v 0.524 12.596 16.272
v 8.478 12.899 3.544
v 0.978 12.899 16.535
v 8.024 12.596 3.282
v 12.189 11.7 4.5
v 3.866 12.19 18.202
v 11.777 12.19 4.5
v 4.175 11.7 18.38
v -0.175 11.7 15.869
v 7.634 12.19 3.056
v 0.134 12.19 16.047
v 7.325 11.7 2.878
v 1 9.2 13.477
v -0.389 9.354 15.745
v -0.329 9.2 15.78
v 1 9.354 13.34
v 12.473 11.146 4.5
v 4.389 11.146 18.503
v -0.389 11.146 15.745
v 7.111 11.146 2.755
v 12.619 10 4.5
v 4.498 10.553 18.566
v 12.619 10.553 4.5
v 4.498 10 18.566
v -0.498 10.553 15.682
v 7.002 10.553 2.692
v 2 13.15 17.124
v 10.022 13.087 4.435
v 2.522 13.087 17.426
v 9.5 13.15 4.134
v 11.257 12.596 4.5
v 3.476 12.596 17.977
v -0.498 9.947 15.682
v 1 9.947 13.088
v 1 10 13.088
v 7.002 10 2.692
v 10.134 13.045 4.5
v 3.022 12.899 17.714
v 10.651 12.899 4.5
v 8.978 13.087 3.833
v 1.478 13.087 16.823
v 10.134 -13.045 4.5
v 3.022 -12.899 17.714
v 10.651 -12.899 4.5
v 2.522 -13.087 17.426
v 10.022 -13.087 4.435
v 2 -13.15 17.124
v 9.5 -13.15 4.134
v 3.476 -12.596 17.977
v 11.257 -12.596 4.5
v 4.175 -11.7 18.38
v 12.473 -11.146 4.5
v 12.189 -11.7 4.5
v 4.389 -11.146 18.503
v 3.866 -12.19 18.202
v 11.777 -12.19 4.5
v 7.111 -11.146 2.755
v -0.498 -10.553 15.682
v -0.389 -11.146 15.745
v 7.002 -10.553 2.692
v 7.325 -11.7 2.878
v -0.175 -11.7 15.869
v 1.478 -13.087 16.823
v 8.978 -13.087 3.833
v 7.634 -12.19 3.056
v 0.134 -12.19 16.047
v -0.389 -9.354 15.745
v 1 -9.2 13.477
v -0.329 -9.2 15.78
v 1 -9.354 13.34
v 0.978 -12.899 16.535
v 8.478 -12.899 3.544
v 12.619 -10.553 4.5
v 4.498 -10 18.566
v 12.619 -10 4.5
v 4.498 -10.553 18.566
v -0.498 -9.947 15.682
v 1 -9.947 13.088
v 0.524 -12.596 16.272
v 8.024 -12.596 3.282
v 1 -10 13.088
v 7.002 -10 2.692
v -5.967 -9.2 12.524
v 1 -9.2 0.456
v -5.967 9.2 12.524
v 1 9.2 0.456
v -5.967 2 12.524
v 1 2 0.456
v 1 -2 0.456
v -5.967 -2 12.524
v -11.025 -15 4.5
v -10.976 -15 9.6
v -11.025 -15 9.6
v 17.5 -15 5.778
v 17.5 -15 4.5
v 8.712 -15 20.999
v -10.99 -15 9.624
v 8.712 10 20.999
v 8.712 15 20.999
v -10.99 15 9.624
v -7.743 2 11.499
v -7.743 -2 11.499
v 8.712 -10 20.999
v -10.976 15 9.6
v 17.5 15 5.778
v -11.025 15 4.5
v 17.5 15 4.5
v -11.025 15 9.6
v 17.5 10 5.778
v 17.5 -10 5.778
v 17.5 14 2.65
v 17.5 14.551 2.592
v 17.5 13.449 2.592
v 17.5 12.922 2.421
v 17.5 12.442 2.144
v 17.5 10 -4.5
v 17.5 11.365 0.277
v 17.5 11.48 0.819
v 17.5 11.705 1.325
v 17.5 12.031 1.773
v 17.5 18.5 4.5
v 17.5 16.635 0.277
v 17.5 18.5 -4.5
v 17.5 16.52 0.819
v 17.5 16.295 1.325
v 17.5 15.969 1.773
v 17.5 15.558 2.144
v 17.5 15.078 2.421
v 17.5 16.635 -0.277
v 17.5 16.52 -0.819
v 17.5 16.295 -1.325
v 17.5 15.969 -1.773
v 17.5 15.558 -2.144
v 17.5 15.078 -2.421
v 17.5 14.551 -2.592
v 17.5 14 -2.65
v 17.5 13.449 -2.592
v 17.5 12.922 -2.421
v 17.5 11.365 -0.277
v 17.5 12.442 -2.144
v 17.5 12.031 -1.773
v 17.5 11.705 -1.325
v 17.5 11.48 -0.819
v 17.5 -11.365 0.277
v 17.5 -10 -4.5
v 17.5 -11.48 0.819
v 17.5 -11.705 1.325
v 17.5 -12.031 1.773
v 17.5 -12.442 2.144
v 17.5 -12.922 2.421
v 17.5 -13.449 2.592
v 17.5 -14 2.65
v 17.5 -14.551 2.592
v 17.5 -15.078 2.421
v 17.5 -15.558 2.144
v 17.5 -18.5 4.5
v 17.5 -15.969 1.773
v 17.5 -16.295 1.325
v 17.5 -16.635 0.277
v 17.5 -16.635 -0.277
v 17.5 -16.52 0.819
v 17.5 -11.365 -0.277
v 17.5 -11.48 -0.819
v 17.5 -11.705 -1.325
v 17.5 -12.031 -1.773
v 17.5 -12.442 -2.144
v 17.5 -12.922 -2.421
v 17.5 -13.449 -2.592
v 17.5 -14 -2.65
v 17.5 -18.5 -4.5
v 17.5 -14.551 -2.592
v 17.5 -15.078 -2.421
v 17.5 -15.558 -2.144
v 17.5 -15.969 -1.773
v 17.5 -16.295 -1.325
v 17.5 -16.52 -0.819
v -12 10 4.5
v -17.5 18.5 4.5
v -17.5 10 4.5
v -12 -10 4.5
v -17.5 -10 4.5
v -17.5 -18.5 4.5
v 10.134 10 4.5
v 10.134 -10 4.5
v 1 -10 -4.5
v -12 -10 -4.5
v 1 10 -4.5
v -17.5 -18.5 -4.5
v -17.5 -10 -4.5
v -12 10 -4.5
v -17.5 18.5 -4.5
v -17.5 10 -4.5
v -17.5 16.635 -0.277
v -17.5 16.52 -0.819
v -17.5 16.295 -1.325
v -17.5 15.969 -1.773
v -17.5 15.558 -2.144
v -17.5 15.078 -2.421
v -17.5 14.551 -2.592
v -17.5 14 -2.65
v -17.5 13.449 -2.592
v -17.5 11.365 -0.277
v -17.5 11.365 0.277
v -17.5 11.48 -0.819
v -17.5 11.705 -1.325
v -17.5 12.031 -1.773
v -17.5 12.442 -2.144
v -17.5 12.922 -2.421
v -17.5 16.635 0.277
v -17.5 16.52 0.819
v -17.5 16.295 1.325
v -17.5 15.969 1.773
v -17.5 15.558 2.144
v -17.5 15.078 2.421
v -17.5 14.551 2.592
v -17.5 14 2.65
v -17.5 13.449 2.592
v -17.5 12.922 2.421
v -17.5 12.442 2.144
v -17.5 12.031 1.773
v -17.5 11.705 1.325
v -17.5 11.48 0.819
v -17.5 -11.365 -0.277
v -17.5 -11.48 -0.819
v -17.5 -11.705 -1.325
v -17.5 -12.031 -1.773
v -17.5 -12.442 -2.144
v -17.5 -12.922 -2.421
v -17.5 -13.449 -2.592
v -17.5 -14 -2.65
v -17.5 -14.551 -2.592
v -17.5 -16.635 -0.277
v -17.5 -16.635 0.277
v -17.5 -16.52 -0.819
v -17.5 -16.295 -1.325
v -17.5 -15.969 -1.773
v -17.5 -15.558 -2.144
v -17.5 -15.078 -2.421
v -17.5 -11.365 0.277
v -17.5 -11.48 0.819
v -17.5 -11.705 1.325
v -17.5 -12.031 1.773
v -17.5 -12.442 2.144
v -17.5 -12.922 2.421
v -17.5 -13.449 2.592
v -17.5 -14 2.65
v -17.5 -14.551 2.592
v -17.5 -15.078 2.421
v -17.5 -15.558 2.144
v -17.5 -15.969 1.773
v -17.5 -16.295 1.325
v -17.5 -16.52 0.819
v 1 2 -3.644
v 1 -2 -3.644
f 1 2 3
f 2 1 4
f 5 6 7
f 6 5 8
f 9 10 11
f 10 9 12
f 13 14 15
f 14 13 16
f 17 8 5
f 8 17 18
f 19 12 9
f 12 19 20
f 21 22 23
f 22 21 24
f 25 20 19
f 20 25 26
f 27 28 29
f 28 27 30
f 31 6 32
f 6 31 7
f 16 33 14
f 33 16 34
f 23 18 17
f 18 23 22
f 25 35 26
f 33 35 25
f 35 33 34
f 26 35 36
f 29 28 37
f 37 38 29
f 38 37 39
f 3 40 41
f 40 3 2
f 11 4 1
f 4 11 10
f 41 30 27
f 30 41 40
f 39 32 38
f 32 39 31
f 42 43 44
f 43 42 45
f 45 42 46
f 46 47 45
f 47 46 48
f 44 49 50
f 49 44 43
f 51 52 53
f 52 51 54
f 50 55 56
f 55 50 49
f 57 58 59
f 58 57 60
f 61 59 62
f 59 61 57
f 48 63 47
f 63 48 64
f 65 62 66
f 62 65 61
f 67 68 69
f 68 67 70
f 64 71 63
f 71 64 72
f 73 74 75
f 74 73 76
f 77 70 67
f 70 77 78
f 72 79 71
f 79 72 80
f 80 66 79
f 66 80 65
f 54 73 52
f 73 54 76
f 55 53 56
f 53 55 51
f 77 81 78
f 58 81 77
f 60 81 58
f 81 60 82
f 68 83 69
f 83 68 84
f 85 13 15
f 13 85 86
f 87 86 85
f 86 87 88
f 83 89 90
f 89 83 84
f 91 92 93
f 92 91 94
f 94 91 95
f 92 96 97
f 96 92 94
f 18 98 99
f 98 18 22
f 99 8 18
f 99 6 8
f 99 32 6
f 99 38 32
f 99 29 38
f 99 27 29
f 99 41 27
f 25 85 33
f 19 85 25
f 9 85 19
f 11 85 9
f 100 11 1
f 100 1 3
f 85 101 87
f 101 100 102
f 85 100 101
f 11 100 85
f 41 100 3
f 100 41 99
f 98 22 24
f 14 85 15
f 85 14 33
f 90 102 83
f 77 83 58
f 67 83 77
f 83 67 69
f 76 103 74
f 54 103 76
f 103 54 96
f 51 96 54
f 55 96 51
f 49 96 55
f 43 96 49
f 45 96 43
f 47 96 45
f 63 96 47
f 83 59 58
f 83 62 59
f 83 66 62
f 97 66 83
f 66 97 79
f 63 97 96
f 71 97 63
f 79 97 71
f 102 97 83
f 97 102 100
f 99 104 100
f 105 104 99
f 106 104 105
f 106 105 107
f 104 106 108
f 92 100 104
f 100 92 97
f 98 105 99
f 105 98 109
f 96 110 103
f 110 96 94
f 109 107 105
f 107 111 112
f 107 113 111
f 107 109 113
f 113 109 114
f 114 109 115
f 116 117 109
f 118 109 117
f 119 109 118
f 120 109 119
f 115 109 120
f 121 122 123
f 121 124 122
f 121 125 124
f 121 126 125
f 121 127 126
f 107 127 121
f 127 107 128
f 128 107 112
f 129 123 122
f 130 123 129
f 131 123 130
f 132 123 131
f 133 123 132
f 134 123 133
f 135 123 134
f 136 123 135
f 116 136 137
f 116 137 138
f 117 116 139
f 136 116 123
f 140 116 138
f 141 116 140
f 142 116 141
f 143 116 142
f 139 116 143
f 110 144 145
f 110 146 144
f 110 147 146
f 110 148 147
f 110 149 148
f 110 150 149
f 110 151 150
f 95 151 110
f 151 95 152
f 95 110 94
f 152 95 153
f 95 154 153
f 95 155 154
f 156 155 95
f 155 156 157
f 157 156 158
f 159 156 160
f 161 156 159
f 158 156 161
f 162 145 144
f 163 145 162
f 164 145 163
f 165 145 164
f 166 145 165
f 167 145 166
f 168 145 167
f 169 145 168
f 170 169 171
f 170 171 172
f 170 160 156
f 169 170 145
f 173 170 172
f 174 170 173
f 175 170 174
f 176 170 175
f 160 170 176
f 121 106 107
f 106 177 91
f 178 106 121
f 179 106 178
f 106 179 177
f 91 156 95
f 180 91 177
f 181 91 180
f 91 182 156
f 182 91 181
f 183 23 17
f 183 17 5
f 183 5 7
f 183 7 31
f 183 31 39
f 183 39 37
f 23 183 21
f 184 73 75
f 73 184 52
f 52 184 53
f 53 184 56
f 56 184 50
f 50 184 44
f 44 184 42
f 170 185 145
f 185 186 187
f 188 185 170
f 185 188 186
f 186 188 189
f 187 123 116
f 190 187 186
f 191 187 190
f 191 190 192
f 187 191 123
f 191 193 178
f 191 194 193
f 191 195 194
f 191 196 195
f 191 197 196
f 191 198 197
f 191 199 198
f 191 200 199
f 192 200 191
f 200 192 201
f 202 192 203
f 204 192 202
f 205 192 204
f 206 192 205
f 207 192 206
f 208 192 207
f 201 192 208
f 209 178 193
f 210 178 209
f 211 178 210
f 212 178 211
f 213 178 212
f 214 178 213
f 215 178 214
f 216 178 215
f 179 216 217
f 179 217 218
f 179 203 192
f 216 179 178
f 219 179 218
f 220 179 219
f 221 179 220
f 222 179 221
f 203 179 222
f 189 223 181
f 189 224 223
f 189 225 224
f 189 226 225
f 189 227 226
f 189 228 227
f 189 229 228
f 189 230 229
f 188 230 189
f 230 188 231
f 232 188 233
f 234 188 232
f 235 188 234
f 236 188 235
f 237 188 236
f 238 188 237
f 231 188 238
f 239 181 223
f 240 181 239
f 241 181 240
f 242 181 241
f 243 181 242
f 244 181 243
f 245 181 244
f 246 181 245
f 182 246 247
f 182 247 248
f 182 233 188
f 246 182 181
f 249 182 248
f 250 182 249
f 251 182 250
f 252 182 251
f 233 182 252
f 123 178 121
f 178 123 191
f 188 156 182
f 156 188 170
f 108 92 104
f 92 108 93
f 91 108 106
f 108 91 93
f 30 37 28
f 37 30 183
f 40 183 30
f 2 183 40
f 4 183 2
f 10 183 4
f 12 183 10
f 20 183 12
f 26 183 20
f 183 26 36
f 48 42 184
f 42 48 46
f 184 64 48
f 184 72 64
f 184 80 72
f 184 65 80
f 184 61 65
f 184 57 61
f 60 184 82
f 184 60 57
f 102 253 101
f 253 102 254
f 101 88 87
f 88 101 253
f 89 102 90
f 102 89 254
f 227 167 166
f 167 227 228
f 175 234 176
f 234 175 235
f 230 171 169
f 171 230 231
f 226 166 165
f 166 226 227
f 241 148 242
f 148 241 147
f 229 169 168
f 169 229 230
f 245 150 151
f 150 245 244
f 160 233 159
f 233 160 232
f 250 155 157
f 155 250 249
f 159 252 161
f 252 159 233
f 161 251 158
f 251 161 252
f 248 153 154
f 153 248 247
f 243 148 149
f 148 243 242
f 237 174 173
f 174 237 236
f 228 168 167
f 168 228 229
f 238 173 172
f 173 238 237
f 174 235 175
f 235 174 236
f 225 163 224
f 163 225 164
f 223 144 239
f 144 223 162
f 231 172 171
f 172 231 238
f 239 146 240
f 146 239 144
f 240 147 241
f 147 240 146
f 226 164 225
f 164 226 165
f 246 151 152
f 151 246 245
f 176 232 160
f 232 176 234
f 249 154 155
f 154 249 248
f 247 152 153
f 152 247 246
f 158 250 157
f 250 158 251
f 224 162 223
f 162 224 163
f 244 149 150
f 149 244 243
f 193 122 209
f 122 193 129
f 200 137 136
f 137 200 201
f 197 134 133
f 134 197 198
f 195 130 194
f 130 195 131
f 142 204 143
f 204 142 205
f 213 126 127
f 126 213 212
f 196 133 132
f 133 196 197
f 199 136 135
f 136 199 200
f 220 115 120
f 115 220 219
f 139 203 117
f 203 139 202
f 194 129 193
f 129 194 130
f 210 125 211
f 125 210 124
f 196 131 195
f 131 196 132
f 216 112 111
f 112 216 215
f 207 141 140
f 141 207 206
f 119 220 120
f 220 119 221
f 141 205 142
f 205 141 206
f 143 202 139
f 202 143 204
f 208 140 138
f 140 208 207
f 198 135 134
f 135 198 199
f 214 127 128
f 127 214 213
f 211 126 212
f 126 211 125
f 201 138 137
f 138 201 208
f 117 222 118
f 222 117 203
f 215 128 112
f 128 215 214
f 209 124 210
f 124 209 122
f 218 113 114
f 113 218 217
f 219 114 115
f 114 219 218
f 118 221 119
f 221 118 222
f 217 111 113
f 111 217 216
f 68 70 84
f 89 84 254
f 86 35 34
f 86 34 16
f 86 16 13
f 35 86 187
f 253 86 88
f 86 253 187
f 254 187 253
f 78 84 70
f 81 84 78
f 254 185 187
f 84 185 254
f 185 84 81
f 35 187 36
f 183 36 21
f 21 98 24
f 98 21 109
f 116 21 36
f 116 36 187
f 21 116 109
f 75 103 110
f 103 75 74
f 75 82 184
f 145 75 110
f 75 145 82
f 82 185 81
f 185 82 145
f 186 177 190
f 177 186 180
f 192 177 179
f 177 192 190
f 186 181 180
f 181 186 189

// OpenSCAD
// file: dronePlates.scad
/**
 * dronePlates.scad
 * Plate library
 *
 * GNU GPL V3
 * @author: Victor Potenciano
 */

m3Rad = 3.4/2;
cornerR = 4;

/**
 *
 */
module helperDisk(diameter) {
	cylinder(r = diameter/2, h = 0.6, $fn=20);
}

/**
 *
 */
module roundedRect(size, radius) {
	x = size[0];
	y = size[1];
	z = size[2];

	linear_extrude(height=z)
	hull() {
	// place 4 circles in the corners, with the given radius
	translate([(-x/2)+(radius/2), (-y/2)+(radius/2), 0]){ circle(r=radius); }
	translate([(x/2)-(radius/2), (-y/2)+(radius/2), 0]){ circle(r=radius); }
	translate([(-x/2)+(radius/2), (y/2)-(radius/2), 0]){ circle(r=radius); }
	translate([(x/2)-(radius/2), (y/2)-(radius/2), 0]){ circle(r=radius); }
	}
}

/**
 * rounded rectangle triangle with corner at origin
 */
module roundedTriangle(size, radius) {
	x = size[0];
	y = size[1];
	z = size[2];

	linear_extrude(height=z)
	hull() {
	translate([radius, radius, 0]){ circle(r=radius); }
	translate([x-radius, radius, 0]){ circle(r=radius); }
	translate([radius, y-radius, 0]){ circle(r=radius); }
	}
}

/**
 *
 */
module roundRectPlate(w, l, plateThick=3) {
	difference(){
		roundedRect([l+m3Rad*1.75,w+m3Rad*1.75,plateThick], cornerR);
		translate([l/2, w/2, -0.5]) { cylinder(h = plateThick+1, r = m3Rad, $fn=30); }
		translate([-l/2, w/2, -0.5]) { cylinder(h = plateThick+1, r = m3Rad, $fn=30); }
		translate([l/2, -w/2, -0.5]) { cylinder(h = plateThick+1, r = m3Rad, $fn=30); }
		translate([-l/2, -w/2, -0.5]) { cylinder(h = plateThick+1, r = m3Rad, $fn=30); }
	}
}

/**
 *
 */
module crossSquarePlate(l, thick=3) {
	inDist = cornerR*2+4;
	trianL = sqrt((l*l)/2)-inDist;
	centerR = 4;

	difference(){
		roundRectPlate(l, l, thick);
		translate([0, centerR, -0.5]) { 
			rotate([0,0,45]){ roundedTriangle([trianL,trianL,thick+1], cornerR-2); }
		}
		translate([0, -centerR, -0.5]) { 
			rotate([0,0,225]){ roundedTriangle([trianL,trianL,thick+1], cornerR-2); }
		}
		translate([-centerR, 0, -0.5]) { 
			rotate([0,0,135]){ roundedTriangle([trianL,trianL,thick+1], cornerR-2); }
		}
		translate([centerR, 0, -0.5]) { 
			rotate([0,0,-45]){ roundedTriangle([trianL,trianL,thick+1], cornerR-2); }
		}
	}
}

/**
 *
 */
module hShapePlate(w, l, thick=4) {
	inDist = cornerR*2+1;

	difference(){
		roundRectPlate(w, l, thick);
		translate([0, w/4, -0.5]) { roundedRect([l-inDist,w/2-inDist,thick+1], cornerR-2); }
		translate([0, -w/4, -0.5]) { roundedRect([l-inDist,w/2-inDist,thick+1], cornerR-2); }
	}
}

/**
 *
 */
module motorCircleMount(inDia, outDia, thick=3, extraH=false, d1=19, d2=16, holeR=m3Rad ) {
	difference(){
		cylinder(h = thick, r = outDia/2, $fn=30);
		motorCircleMountHoles(inDia, outDia, thick, extraH, d1=d1, d2=d2, holeR=holeR);
	}
}

/**
 *
 */
module motorCircleMountHoles(inDia, outDia, thick=3, extraH=false, d1=19, d2=16, d3=25, holeR=m3Rad) {
	translate([0, 0, -0.5]) { cylinder(h = thick+1, r = inDia/2, $fn=30); }

	for(i=[0:3]) {
		rotate([0,0,90*i]){
		translate([d1/2, 0, -0.5]) cylinder(h = thick+1, r = holeR, $fn=20);
		translate([d2/2, 0, -0.5]) cylinder(h = thick+1, r = holeR, $fn=20);
		translate([d2/2, -holeR, -0.5]) cube(size = [(d1-d2)/2,holeR*2,thick+1]);
		}
	}
	
	if(extraH==true){	
		for(i=[-1,1]) translate([i*d3/2, 0, -0.5]) { cylinder(h = thick+1, r = holeR, $fn=30); }
	}
}

/**
 *
 */
module motorRectMount(w, l, inDia, thick=3) {
	d1=19;
	d2=16;

	difference(){
		roundRectPlate(w, l, thick);
		translate([0, 0, -0.5]) { cylinder(h = thick+1, r = inDia/2, $fn=30); }
		translate([0, d1/2, -0.5]) { cylinder(h = thick+1, r = m3Rad, $fn=30); }
		translate([0, -d1/2, -0.5]) { cylinder(h = thick+1, r = m3Rad, $fn=30); }
		translate([d2/2, 0, -0.5]) { cylinder(h = thick+1, r = m3Rad, $fn=30); }
		translate([-d2/2, 0, -0.5]) { cylinder(h = thick+1, r = m3Rad, $fn=30); }
	}
}

/**
 *
 */
module tube(inDia, outDia, height) {
	difference(){
		cylinder(h = height, r = outDia/2, $fn=50);
		translate([0, 0, -0.5]) { cylinder(h = height+1, r = inDia/2, $fn=30); }
	}
}

/**
 *
 */
module squareTube(inDia, outDia, height) {
	translate([0,0,height/2]){
	difference(){
		cube(size = [outDia,outDia,height], center = true);
		cube(size = [inDia,inDia,height+1], center = true);
	}
	}
}

/**
 *
 */
module djiFlamewheelHoles(height) {
	a = 23;
	b = 16;
	c = 19.5;
	
	translate([a/2, c/2, 0]) { cylinder(h = height, r = m3Rad, $fn=30); }
	translate([-a/2, c/2, 0]) { cylinder(h = height, r = m3Rad, $fn=30); }
	translate([b/2, -c/2, 0]) { cylinder(h = height, r = m3Rad, $fn=30); }
	translate([-b/2, -c/2, 0]) { cylinder(h = height, r = m3Rad, $fn=30); }
}

/**
 *
 */
module djiFlamewheelHolesBotton(height) {
	a1 = 21;
	c = 19.5;
	
	translate([a1/2, c/2, 0]) { cylinder(h = height, r = m3Rad, $fn=30); }
	translate([-a1/2, c/2, 0]) { cylinder(h = height, r = m3Rad, $fn=30); }
}

/**
 *
 */
module propeller(size){
union(){
difference(){
	cylinder(h = 3, r = size/2, center=true, $fn=30);
	cylinder(h = 3.1, r = size/2-2, center=true, $fn=30); 
}
for( i = [-1,1] ){
rotate([0,0,45*i]){ cube(size = [size,4,1], center = true); }
}
}
}

/**
 *
 */
module slot(length, height, rad){
for(i=[-1,1]) translate([i*length/2,0,0]) cylinder(h = height, r = rad, $fn=30);
translate([0,0,height/2]) cube(size = [length,rad*2,height], center = true);
}

 

////////////////////////
// Examples:
////////////////////////

motorCircleMount(8, 25, 3.5);

//roundedRect([50,50,3], 4);

//hShapePlate(79, 25);

//rotate([0,0,45]){roundedTriangle([40,40,3], 4);}

//crossSquarePlate(45, 4);

/*
union(){
motorRectMount(21, 18, 8, 4);
translate([9, 10.5, 0]) {tube(m3Rad*2, 6.5, 6);}
}
*/

/*
difference(){
union(){
hShapePlate(50, 30, 3.5);
translate([-4,-25,0]){cube(size = [8,50,3.5]);}
rotate([0, 0, 45]) {motorCircleMount(8, 35, 3.5);}
}
cylinder(h = 10, r = 4, $fn=100, center=true);
}
*/

//rotate([90,0,0]){ tube(5,10,20); }
//translate([20,0,0]){ squareTube(5, 10, 20); }
// main file
/**
 * lt210 fpv camera mount
 */
 
use <dronePlates.scad>;

thick = 1.5;
hubSqH=28;
tolerance=0.4;
front_cc = 28;
angle=30;

/**
 *
 */
module cameraHub(tolerance=0){
sqL = 18;

translate([0,0,hubSqH/2]) cube(size=[sqL+tolerance,sqL+tolerance,hubSqH+tolerance], center=true);
cylinder(r=7.5+(tolerance/2), h=16, $fn=20);
for(i=[-1,1]) translate([i*10.25,0,0]) cylinder(h=hubSqH,r=2.7+(tolerance/2),$fn=30);
translate([0,0,16/2])cube(size=[3+tolerance,sqL+4+tolerance,16], center=true);
}//end module

/**
 *
 */
module housing(){
difference(){
cube(size=[30,30,hubSqH-2], center=true);
scale([1,1,1.1]) translate([0,0,-hubSqH/2]) cameraHub(tolerance=tolerance);
translate([0,13,0]) cube(size=[32+1,10+0.5,hubSqH], center=true);
}
}//end module

/**
 *
 */
module fpvCam(){
    union(){
    cube([32,32,1.5], center=true);
    translate([0,0,4]) cube([18,18,8], center=true);
    cylinder(r=8.5, h=25, $fn=20);
    }
}

shiftZ= 5;
shiftX=9;
preShZ = -1;
///color("grey") translate([0,0,19]) rotate([0,180-angle,0]) fpvCam();

color(alpha=0.4)
difference(){
    union(){
        cube([35,37,9], center=true);
        translate([shiftX,0,shiftZ])  rotate([0,-angle,0]) translate([0,0,-preShZ]) rotate([0,0,-90]) housing();
        translate([-9.4,0,0])  cube([3.25,30,19.2], center=true);
    }
    
    translate([shiftX,0,shiftZ]) rotate([0,-angle,0]) {
    translate([0,0,preShZ]) rotate([0,0,-90]) cameraHub(tolerance=tolerance);
    cylinder(r=8.2, h=60, center=true, $fn=30);
    translate([-9.25,0,0]) cube(size=[4,4,60], center=true);
    }
    
    for(i=[-1,1]){
        translate([0,i*front_cc/2,0]) rotate([0,90,0]) 
            cylinder(r=5.3/2, h=100, $fn=30, center=true);
    }
    
    translate([10,0,0]) cube(size=[18,20,50], center=true);
    translate([35/2+10/2,0,0]) cube(size=[10,40,50], center=true);
    translate([0,0,-9.5]) cube(size=[40,40,10], center=true);
    translate([-17,0,0]) cube(size=[10,20,50], center=true);
}
